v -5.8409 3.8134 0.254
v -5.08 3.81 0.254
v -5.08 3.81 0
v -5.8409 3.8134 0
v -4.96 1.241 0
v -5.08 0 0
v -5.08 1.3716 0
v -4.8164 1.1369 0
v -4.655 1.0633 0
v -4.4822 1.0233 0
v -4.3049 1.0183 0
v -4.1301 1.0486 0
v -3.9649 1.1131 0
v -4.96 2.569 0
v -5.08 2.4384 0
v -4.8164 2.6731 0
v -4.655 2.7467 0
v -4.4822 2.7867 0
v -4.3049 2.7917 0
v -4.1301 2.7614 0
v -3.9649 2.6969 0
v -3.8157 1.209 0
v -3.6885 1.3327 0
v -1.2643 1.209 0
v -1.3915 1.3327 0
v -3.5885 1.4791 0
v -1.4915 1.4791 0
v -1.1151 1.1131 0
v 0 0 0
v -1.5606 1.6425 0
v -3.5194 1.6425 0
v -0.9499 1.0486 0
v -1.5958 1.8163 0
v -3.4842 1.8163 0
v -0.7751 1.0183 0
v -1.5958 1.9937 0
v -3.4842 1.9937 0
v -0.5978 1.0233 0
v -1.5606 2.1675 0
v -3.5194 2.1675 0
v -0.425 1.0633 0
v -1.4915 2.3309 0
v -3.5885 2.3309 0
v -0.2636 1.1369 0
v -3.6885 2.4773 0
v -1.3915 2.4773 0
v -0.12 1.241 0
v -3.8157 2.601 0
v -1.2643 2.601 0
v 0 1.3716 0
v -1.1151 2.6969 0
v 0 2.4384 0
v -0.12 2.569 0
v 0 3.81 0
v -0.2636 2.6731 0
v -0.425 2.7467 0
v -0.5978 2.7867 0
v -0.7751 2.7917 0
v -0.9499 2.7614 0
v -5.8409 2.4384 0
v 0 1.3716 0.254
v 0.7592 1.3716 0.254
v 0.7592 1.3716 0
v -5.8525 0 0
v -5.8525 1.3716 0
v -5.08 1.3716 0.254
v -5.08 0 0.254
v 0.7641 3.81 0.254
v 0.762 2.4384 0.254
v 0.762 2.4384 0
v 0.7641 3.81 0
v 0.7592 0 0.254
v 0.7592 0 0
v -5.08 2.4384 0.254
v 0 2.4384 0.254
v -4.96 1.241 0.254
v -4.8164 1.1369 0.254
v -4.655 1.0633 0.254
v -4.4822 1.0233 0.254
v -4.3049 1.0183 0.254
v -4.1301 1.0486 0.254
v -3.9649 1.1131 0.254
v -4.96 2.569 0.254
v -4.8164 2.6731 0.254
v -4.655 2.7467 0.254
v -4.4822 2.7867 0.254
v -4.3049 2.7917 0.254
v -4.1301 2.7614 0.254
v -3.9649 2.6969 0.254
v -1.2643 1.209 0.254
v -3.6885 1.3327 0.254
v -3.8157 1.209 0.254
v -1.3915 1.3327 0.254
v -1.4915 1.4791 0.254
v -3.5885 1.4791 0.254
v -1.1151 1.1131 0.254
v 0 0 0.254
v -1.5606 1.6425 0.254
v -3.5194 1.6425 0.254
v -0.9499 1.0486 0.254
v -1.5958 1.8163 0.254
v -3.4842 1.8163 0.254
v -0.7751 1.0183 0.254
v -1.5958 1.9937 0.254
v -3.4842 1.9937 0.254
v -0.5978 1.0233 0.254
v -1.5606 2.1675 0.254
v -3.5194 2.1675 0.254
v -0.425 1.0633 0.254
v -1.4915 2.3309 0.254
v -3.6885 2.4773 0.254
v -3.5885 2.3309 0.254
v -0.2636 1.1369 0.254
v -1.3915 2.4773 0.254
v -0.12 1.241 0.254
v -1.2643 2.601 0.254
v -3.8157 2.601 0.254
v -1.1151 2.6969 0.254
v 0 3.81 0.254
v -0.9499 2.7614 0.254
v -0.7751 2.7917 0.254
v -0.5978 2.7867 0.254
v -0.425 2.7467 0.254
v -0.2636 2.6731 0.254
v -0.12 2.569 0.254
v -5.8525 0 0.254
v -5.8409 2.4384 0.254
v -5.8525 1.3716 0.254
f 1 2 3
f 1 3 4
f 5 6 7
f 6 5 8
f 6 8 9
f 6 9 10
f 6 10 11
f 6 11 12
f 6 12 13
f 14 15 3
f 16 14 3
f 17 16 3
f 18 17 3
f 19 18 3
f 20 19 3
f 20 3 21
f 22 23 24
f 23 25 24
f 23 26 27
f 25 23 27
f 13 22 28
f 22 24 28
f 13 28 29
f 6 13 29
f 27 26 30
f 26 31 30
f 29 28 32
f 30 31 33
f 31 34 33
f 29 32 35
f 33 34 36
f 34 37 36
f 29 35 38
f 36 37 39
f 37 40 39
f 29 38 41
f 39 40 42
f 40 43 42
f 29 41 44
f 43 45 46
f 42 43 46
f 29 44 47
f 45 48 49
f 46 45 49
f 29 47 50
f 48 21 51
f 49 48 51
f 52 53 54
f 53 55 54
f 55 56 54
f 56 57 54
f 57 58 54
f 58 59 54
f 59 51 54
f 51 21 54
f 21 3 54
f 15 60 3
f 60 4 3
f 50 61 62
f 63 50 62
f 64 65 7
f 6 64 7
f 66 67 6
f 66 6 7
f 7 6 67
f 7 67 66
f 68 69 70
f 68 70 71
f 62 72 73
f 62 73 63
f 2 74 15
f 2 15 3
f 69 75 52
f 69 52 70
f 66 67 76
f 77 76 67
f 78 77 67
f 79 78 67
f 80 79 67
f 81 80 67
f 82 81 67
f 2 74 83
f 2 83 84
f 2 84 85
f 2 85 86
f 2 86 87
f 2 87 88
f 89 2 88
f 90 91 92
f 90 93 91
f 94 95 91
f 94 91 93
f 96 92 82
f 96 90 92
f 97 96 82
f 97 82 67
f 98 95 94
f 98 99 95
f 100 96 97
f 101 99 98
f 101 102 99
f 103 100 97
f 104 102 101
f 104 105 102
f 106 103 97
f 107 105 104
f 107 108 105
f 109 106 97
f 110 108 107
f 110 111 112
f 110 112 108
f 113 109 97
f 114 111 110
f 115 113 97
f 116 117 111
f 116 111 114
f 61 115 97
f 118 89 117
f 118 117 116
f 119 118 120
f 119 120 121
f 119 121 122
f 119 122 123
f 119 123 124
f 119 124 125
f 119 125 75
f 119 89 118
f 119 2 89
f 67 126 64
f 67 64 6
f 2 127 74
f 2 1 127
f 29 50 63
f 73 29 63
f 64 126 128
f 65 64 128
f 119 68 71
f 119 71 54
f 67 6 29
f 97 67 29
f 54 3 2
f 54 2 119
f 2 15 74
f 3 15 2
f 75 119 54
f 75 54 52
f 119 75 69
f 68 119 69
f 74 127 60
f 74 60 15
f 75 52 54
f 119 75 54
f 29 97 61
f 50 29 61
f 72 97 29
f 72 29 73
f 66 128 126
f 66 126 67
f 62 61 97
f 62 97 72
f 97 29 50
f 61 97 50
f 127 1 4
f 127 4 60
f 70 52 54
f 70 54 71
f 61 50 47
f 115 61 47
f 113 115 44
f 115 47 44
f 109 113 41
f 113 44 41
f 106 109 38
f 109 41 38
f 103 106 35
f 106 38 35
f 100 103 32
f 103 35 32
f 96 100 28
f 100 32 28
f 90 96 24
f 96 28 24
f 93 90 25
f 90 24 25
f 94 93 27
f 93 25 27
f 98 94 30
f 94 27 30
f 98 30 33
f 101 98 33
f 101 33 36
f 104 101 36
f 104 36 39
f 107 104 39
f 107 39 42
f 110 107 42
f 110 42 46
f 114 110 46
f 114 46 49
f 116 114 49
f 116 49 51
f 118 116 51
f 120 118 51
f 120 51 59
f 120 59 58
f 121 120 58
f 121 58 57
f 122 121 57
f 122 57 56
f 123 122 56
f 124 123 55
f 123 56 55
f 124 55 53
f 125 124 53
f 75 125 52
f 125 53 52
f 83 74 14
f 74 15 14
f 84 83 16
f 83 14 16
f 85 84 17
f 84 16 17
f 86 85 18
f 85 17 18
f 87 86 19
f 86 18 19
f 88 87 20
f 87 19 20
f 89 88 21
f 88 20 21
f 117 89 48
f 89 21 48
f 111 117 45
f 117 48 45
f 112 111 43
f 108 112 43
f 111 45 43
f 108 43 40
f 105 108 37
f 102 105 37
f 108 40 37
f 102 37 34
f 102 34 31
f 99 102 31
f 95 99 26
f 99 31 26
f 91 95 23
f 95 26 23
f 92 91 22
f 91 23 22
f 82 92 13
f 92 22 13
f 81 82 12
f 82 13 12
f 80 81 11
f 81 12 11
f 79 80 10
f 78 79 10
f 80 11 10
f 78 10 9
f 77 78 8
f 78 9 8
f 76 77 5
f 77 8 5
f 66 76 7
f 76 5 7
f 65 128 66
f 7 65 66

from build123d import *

# Parameters (mm, degrees)
F0_W      = 5.08
F0_H      = 3.81
F1_DEPTH  = 0.254
F3_D      = 1.778
F3_DEPTH  = 25.4
F3_TIP    = 0.5341650903
F5_D      = 1.778
F5_DEPTH  = 25.4
F5_TIP    = 0.5341650903
F7_DEPTH  = 0.254
F9_DEPTH  = 0.254
F10_W     = 0.7592265029
F10_H     = 1.3716
F11_DEPTH = 0.254
F12_W     = 0.7725130153
F12_H     = 1.3716
F13_DEPTH = 0.254


# Not quite as in the source:
# - a feature names something its author has since deleted; it is built from what else it names


with BuildPart() as f1:
    # F0 (on Top) → F1 (new body)
    with BuildSketch(Plane.XY):
        with Locations((-2.54, 1.905)):
            Rectangle(F0_W, F0_H)
    extrude(amount=F1_DEPTH)

    # F3
    with Locations(Plane.XY.offset(0.254)):
        with Locations((-4.3688, 1.905)):
            Hole(F3_D / 2, depth=F3_DEPTH)
            with Locations((0, 0, -(F3_DEPTH + F3_TIP / 2))):  # 118° drill point
                Cone(0, F3_D / 2, F3_TIP, mode=Mode.SUBTRACT)

    # F5
    with Locations(Plane.XY.offset(0.254)):
        with Locations((-0.7112, 1.905)):
            Hole(F5_D / 2, depth=F5_DEPTH)
            with Locations((0, 0, -(F5_DEPTH + F5_TIP / 2))):  # 118° drill point
                Cone(0, F5_D / 2, F5_TIP, mode=Mode.SUBTRACT)


with BuildPart() as f7:
    # F6 (on face) → F7 (new body)
    with BuildSketch(Plane.XY.offset(0.254)):
        Polygon((0.7640526164, 3.81), (0, 3.81), (0, 2.4384), (0.762, 2.4384), align=None)
    extrude(amount=-F7_DEPTH)


with BuildPart() as f9:
    # F8 (on face) → F9 (new body)
    with BuildSketch(Plane.XY.offset(0.254)):
        Polygon((-5.8408910409, 2.4384), (-5.08, 2.4384), (-5.08, 3.81), (-5.8408910409, 3.8134478964), align=None)
    extrude(amount=-F9_DEPTH)


with BuildPart() as f11:
    # F10 (on face) → F11 (new body)
    with BuildSketch(Plane.XY.offset(0.254)):
        with Locations((0.3796132514, 0.6858)):
            Rectangle(F10_W, F10_H)
    extrude(amount=-F11_DEPTH)


with BuildPart() as f13:
    # F12 (on face) → F13 (new body)
    with BuildSketch(Plane.XY.offset(0.254)):
        with Locations((-5.4662565076, 0.6858)):
            Rectangle(F12_W, F12_H)
    extrude(amount=-F13_DEPTH)


solid = Compound([f1.part, f7.part, f9.part, f11.part, f13.part])
